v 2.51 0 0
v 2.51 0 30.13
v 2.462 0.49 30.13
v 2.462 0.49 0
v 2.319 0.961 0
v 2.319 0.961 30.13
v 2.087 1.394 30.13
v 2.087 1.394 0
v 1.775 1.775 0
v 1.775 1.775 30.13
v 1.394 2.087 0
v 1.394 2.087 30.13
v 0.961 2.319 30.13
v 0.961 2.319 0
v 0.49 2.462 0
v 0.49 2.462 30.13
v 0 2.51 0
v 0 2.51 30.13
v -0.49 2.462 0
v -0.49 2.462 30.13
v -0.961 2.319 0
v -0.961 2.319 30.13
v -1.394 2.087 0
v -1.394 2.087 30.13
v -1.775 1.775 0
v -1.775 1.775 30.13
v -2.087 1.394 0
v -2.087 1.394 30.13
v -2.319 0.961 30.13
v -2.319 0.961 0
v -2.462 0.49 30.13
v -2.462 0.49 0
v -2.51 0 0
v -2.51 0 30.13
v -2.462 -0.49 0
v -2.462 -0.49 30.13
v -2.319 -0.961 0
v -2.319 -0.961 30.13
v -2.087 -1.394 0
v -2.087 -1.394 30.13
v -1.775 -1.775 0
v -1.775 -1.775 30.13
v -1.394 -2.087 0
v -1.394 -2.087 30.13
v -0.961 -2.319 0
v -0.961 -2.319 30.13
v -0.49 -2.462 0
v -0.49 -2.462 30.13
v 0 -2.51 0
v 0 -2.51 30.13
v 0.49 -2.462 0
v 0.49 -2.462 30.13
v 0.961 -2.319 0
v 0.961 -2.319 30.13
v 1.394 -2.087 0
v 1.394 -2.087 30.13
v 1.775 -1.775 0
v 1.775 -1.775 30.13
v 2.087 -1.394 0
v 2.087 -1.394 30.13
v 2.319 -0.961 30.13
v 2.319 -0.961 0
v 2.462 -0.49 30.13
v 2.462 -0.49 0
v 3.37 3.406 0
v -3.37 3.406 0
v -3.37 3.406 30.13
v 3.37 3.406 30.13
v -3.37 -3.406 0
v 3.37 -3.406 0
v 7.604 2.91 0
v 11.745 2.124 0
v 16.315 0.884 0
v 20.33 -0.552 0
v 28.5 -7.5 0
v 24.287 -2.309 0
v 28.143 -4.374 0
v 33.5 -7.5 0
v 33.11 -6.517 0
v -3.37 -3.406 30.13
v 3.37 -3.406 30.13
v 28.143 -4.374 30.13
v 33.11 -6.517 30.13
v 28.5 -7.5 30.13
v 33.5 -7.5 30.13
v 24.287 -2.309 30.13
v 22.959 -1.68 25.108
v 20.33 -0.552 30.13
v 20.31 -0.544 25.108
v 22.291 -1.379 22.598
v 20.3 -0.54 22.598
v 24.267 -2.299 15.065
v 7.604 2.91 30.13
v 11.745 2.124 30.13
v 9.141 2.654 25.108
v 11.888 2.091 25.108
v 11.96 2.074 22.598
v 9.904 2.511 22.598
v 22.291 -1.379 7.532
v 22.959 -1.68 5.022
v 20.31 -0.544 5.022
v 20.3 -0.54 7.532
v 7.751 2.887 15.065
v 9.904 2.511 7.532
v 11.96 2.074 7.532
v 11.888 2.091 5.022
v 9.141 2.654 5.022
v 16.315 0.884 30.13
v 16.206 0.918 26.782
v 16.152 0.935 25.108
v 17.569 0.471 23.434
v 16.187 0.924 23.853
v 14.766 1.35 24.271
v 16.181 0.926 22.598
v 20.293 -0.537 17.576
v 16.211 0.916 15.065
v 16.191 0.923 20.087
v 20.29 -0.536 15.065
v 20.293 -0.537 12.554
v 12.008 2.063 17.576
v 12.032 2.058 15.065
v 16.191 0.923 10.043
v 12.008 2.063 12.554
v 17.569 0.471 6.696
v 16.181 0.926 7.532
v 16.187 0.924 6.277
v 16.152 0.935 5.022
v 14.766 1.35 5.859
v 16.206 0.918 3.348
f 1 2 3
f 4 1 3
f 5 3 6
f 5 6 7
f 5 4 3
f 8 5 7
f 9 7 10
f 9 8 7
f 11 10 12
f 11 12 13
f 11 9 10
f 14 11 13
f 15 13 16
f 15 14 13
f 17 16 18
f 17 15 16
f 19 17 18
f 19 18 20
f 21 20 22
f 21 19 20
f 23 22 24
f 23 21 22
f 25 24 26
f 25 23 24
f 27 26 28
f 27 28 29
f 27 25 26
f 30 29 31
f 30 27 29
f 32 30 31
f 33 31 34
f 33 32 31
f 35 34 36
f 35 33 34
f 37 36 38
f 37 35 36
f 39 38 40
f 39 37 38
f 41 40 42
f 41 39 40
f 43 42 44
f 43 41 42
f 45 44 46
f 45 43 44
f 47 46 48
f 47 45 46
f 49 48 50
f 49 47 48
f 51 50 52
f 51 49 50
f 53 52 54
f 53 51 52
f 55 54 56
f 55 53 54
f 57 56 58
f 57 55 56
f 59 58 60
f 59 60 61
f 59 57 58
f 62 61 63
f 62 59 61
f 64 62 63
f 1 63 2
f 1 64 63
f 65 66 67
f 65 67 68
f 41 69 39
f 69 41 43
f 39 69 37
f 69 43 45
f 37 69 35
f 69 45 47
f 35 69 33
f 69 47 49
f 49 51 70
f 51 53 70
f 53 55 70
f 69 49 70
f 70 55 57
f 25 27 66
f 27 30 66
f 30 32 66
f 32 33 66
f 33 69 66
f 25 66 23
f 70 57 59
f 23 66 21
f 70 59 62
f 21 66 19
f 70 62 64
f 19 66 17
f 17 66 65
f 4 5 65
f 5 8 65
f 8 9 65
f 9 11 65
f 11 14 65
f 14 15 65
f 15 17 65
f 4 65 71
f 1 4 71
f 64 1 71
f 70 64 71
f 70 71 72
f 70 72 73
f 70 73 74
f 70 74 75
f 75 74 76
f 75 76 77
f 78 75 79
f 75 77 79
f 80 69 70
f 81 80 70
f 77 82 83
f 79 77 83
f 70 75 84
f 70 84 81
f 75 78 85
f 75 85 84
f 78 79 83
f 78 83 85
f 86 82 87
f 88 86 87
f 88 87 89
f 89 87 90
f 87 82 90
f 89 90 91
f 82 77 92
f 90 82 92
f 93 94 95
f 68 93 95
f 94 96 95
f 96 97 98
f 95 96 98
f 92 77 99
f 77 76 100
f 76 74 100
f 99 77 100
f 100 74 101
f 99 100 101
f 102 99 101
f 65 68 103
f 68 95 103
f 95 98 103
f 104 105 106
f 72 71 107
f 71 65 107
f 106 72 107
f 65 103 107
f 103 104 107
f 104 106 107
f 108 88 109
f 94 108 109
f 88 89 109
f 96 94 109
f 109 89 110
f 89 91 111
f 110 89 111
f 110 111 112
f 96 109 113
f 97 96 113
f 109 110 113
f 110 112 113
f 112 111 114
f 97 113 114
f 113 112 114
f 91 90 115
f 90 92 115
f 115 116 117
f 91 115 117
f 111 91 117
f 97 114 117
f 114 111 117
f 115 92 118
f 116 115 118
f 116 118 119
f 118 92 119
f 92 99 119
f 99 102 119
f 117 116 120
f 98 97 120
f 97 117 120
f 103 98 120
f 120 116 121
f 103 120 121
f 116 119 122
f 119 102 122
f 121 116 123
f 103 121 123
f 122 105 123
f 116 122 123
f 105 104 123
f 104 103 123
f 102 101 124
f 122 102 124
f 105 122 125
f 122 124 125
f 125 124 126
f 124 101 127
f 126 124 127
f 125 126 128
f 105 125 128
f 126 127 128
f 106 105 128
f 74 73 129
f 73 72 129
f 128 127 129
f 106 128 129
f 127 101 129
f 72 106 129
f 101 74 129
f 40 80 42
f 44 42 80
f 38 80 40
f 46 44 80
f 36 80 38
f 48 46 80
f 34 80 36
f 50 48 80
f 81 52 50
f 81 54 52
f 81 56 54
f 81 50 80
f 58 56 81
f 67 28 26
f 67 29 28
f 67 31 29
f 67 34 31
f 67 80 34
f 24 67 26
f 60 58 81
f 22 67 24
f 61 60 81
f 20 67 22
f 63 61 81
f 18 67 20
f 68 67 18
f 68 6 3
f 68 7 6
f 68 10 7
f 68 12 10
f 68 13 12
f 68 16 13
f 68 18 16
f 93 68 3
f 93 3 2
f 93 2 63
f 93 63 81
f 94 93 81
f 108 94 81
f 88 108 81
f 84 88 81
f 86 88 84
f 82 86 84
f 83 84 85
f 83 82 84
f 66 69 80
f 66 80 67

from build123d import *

# Parameters (mm, degrees)
SKETCH1_W           = 6.73955421
SKETCH1_H           = 6.812677774
SKETCH1_R           = 2.51
BOSS_EXTRUDE1_DEPTH = 30.13


with BuildPart() as part:
    # Sketch1 → Boss-Extrude1 (new body)
    with BuildSketch(Plane.XY):
        Rectangle(SKETCH1_W, SKETCH1_H)
        Circle(SKETCH1_R, mode=Mode.SUBTRACT)
        with BuildLine():
            add(Edge.make_bspline(
                [(28.500199806, -7.5), (3.369777105, -3.406338887)],
                knots=[0, 0, 1, 1], degree=1))
            Line((3.369777105, -3.406338887), (3.369777105, 3.406338887))
            add(Edge.make_bspline(
                [(28.143383308, -4.373850119), (16.666117653, 2.316528631), (3.369777105, 3.406338887)],
                knots=[0, 0, 0, 1, 1, 1], degree=2))
            Line((28.143383308, -4.373850119), (33.109649153, -6.51665119))
            Line((33.109649153, -6.51665119), (33.500199806, -7.5))
            Line((33.500199806, -7.5), (28.500199806, -7.5))
        make_face()
    extrude(amount=BOSS_EXTRUDE1_DEPTH)


solid = part.part
